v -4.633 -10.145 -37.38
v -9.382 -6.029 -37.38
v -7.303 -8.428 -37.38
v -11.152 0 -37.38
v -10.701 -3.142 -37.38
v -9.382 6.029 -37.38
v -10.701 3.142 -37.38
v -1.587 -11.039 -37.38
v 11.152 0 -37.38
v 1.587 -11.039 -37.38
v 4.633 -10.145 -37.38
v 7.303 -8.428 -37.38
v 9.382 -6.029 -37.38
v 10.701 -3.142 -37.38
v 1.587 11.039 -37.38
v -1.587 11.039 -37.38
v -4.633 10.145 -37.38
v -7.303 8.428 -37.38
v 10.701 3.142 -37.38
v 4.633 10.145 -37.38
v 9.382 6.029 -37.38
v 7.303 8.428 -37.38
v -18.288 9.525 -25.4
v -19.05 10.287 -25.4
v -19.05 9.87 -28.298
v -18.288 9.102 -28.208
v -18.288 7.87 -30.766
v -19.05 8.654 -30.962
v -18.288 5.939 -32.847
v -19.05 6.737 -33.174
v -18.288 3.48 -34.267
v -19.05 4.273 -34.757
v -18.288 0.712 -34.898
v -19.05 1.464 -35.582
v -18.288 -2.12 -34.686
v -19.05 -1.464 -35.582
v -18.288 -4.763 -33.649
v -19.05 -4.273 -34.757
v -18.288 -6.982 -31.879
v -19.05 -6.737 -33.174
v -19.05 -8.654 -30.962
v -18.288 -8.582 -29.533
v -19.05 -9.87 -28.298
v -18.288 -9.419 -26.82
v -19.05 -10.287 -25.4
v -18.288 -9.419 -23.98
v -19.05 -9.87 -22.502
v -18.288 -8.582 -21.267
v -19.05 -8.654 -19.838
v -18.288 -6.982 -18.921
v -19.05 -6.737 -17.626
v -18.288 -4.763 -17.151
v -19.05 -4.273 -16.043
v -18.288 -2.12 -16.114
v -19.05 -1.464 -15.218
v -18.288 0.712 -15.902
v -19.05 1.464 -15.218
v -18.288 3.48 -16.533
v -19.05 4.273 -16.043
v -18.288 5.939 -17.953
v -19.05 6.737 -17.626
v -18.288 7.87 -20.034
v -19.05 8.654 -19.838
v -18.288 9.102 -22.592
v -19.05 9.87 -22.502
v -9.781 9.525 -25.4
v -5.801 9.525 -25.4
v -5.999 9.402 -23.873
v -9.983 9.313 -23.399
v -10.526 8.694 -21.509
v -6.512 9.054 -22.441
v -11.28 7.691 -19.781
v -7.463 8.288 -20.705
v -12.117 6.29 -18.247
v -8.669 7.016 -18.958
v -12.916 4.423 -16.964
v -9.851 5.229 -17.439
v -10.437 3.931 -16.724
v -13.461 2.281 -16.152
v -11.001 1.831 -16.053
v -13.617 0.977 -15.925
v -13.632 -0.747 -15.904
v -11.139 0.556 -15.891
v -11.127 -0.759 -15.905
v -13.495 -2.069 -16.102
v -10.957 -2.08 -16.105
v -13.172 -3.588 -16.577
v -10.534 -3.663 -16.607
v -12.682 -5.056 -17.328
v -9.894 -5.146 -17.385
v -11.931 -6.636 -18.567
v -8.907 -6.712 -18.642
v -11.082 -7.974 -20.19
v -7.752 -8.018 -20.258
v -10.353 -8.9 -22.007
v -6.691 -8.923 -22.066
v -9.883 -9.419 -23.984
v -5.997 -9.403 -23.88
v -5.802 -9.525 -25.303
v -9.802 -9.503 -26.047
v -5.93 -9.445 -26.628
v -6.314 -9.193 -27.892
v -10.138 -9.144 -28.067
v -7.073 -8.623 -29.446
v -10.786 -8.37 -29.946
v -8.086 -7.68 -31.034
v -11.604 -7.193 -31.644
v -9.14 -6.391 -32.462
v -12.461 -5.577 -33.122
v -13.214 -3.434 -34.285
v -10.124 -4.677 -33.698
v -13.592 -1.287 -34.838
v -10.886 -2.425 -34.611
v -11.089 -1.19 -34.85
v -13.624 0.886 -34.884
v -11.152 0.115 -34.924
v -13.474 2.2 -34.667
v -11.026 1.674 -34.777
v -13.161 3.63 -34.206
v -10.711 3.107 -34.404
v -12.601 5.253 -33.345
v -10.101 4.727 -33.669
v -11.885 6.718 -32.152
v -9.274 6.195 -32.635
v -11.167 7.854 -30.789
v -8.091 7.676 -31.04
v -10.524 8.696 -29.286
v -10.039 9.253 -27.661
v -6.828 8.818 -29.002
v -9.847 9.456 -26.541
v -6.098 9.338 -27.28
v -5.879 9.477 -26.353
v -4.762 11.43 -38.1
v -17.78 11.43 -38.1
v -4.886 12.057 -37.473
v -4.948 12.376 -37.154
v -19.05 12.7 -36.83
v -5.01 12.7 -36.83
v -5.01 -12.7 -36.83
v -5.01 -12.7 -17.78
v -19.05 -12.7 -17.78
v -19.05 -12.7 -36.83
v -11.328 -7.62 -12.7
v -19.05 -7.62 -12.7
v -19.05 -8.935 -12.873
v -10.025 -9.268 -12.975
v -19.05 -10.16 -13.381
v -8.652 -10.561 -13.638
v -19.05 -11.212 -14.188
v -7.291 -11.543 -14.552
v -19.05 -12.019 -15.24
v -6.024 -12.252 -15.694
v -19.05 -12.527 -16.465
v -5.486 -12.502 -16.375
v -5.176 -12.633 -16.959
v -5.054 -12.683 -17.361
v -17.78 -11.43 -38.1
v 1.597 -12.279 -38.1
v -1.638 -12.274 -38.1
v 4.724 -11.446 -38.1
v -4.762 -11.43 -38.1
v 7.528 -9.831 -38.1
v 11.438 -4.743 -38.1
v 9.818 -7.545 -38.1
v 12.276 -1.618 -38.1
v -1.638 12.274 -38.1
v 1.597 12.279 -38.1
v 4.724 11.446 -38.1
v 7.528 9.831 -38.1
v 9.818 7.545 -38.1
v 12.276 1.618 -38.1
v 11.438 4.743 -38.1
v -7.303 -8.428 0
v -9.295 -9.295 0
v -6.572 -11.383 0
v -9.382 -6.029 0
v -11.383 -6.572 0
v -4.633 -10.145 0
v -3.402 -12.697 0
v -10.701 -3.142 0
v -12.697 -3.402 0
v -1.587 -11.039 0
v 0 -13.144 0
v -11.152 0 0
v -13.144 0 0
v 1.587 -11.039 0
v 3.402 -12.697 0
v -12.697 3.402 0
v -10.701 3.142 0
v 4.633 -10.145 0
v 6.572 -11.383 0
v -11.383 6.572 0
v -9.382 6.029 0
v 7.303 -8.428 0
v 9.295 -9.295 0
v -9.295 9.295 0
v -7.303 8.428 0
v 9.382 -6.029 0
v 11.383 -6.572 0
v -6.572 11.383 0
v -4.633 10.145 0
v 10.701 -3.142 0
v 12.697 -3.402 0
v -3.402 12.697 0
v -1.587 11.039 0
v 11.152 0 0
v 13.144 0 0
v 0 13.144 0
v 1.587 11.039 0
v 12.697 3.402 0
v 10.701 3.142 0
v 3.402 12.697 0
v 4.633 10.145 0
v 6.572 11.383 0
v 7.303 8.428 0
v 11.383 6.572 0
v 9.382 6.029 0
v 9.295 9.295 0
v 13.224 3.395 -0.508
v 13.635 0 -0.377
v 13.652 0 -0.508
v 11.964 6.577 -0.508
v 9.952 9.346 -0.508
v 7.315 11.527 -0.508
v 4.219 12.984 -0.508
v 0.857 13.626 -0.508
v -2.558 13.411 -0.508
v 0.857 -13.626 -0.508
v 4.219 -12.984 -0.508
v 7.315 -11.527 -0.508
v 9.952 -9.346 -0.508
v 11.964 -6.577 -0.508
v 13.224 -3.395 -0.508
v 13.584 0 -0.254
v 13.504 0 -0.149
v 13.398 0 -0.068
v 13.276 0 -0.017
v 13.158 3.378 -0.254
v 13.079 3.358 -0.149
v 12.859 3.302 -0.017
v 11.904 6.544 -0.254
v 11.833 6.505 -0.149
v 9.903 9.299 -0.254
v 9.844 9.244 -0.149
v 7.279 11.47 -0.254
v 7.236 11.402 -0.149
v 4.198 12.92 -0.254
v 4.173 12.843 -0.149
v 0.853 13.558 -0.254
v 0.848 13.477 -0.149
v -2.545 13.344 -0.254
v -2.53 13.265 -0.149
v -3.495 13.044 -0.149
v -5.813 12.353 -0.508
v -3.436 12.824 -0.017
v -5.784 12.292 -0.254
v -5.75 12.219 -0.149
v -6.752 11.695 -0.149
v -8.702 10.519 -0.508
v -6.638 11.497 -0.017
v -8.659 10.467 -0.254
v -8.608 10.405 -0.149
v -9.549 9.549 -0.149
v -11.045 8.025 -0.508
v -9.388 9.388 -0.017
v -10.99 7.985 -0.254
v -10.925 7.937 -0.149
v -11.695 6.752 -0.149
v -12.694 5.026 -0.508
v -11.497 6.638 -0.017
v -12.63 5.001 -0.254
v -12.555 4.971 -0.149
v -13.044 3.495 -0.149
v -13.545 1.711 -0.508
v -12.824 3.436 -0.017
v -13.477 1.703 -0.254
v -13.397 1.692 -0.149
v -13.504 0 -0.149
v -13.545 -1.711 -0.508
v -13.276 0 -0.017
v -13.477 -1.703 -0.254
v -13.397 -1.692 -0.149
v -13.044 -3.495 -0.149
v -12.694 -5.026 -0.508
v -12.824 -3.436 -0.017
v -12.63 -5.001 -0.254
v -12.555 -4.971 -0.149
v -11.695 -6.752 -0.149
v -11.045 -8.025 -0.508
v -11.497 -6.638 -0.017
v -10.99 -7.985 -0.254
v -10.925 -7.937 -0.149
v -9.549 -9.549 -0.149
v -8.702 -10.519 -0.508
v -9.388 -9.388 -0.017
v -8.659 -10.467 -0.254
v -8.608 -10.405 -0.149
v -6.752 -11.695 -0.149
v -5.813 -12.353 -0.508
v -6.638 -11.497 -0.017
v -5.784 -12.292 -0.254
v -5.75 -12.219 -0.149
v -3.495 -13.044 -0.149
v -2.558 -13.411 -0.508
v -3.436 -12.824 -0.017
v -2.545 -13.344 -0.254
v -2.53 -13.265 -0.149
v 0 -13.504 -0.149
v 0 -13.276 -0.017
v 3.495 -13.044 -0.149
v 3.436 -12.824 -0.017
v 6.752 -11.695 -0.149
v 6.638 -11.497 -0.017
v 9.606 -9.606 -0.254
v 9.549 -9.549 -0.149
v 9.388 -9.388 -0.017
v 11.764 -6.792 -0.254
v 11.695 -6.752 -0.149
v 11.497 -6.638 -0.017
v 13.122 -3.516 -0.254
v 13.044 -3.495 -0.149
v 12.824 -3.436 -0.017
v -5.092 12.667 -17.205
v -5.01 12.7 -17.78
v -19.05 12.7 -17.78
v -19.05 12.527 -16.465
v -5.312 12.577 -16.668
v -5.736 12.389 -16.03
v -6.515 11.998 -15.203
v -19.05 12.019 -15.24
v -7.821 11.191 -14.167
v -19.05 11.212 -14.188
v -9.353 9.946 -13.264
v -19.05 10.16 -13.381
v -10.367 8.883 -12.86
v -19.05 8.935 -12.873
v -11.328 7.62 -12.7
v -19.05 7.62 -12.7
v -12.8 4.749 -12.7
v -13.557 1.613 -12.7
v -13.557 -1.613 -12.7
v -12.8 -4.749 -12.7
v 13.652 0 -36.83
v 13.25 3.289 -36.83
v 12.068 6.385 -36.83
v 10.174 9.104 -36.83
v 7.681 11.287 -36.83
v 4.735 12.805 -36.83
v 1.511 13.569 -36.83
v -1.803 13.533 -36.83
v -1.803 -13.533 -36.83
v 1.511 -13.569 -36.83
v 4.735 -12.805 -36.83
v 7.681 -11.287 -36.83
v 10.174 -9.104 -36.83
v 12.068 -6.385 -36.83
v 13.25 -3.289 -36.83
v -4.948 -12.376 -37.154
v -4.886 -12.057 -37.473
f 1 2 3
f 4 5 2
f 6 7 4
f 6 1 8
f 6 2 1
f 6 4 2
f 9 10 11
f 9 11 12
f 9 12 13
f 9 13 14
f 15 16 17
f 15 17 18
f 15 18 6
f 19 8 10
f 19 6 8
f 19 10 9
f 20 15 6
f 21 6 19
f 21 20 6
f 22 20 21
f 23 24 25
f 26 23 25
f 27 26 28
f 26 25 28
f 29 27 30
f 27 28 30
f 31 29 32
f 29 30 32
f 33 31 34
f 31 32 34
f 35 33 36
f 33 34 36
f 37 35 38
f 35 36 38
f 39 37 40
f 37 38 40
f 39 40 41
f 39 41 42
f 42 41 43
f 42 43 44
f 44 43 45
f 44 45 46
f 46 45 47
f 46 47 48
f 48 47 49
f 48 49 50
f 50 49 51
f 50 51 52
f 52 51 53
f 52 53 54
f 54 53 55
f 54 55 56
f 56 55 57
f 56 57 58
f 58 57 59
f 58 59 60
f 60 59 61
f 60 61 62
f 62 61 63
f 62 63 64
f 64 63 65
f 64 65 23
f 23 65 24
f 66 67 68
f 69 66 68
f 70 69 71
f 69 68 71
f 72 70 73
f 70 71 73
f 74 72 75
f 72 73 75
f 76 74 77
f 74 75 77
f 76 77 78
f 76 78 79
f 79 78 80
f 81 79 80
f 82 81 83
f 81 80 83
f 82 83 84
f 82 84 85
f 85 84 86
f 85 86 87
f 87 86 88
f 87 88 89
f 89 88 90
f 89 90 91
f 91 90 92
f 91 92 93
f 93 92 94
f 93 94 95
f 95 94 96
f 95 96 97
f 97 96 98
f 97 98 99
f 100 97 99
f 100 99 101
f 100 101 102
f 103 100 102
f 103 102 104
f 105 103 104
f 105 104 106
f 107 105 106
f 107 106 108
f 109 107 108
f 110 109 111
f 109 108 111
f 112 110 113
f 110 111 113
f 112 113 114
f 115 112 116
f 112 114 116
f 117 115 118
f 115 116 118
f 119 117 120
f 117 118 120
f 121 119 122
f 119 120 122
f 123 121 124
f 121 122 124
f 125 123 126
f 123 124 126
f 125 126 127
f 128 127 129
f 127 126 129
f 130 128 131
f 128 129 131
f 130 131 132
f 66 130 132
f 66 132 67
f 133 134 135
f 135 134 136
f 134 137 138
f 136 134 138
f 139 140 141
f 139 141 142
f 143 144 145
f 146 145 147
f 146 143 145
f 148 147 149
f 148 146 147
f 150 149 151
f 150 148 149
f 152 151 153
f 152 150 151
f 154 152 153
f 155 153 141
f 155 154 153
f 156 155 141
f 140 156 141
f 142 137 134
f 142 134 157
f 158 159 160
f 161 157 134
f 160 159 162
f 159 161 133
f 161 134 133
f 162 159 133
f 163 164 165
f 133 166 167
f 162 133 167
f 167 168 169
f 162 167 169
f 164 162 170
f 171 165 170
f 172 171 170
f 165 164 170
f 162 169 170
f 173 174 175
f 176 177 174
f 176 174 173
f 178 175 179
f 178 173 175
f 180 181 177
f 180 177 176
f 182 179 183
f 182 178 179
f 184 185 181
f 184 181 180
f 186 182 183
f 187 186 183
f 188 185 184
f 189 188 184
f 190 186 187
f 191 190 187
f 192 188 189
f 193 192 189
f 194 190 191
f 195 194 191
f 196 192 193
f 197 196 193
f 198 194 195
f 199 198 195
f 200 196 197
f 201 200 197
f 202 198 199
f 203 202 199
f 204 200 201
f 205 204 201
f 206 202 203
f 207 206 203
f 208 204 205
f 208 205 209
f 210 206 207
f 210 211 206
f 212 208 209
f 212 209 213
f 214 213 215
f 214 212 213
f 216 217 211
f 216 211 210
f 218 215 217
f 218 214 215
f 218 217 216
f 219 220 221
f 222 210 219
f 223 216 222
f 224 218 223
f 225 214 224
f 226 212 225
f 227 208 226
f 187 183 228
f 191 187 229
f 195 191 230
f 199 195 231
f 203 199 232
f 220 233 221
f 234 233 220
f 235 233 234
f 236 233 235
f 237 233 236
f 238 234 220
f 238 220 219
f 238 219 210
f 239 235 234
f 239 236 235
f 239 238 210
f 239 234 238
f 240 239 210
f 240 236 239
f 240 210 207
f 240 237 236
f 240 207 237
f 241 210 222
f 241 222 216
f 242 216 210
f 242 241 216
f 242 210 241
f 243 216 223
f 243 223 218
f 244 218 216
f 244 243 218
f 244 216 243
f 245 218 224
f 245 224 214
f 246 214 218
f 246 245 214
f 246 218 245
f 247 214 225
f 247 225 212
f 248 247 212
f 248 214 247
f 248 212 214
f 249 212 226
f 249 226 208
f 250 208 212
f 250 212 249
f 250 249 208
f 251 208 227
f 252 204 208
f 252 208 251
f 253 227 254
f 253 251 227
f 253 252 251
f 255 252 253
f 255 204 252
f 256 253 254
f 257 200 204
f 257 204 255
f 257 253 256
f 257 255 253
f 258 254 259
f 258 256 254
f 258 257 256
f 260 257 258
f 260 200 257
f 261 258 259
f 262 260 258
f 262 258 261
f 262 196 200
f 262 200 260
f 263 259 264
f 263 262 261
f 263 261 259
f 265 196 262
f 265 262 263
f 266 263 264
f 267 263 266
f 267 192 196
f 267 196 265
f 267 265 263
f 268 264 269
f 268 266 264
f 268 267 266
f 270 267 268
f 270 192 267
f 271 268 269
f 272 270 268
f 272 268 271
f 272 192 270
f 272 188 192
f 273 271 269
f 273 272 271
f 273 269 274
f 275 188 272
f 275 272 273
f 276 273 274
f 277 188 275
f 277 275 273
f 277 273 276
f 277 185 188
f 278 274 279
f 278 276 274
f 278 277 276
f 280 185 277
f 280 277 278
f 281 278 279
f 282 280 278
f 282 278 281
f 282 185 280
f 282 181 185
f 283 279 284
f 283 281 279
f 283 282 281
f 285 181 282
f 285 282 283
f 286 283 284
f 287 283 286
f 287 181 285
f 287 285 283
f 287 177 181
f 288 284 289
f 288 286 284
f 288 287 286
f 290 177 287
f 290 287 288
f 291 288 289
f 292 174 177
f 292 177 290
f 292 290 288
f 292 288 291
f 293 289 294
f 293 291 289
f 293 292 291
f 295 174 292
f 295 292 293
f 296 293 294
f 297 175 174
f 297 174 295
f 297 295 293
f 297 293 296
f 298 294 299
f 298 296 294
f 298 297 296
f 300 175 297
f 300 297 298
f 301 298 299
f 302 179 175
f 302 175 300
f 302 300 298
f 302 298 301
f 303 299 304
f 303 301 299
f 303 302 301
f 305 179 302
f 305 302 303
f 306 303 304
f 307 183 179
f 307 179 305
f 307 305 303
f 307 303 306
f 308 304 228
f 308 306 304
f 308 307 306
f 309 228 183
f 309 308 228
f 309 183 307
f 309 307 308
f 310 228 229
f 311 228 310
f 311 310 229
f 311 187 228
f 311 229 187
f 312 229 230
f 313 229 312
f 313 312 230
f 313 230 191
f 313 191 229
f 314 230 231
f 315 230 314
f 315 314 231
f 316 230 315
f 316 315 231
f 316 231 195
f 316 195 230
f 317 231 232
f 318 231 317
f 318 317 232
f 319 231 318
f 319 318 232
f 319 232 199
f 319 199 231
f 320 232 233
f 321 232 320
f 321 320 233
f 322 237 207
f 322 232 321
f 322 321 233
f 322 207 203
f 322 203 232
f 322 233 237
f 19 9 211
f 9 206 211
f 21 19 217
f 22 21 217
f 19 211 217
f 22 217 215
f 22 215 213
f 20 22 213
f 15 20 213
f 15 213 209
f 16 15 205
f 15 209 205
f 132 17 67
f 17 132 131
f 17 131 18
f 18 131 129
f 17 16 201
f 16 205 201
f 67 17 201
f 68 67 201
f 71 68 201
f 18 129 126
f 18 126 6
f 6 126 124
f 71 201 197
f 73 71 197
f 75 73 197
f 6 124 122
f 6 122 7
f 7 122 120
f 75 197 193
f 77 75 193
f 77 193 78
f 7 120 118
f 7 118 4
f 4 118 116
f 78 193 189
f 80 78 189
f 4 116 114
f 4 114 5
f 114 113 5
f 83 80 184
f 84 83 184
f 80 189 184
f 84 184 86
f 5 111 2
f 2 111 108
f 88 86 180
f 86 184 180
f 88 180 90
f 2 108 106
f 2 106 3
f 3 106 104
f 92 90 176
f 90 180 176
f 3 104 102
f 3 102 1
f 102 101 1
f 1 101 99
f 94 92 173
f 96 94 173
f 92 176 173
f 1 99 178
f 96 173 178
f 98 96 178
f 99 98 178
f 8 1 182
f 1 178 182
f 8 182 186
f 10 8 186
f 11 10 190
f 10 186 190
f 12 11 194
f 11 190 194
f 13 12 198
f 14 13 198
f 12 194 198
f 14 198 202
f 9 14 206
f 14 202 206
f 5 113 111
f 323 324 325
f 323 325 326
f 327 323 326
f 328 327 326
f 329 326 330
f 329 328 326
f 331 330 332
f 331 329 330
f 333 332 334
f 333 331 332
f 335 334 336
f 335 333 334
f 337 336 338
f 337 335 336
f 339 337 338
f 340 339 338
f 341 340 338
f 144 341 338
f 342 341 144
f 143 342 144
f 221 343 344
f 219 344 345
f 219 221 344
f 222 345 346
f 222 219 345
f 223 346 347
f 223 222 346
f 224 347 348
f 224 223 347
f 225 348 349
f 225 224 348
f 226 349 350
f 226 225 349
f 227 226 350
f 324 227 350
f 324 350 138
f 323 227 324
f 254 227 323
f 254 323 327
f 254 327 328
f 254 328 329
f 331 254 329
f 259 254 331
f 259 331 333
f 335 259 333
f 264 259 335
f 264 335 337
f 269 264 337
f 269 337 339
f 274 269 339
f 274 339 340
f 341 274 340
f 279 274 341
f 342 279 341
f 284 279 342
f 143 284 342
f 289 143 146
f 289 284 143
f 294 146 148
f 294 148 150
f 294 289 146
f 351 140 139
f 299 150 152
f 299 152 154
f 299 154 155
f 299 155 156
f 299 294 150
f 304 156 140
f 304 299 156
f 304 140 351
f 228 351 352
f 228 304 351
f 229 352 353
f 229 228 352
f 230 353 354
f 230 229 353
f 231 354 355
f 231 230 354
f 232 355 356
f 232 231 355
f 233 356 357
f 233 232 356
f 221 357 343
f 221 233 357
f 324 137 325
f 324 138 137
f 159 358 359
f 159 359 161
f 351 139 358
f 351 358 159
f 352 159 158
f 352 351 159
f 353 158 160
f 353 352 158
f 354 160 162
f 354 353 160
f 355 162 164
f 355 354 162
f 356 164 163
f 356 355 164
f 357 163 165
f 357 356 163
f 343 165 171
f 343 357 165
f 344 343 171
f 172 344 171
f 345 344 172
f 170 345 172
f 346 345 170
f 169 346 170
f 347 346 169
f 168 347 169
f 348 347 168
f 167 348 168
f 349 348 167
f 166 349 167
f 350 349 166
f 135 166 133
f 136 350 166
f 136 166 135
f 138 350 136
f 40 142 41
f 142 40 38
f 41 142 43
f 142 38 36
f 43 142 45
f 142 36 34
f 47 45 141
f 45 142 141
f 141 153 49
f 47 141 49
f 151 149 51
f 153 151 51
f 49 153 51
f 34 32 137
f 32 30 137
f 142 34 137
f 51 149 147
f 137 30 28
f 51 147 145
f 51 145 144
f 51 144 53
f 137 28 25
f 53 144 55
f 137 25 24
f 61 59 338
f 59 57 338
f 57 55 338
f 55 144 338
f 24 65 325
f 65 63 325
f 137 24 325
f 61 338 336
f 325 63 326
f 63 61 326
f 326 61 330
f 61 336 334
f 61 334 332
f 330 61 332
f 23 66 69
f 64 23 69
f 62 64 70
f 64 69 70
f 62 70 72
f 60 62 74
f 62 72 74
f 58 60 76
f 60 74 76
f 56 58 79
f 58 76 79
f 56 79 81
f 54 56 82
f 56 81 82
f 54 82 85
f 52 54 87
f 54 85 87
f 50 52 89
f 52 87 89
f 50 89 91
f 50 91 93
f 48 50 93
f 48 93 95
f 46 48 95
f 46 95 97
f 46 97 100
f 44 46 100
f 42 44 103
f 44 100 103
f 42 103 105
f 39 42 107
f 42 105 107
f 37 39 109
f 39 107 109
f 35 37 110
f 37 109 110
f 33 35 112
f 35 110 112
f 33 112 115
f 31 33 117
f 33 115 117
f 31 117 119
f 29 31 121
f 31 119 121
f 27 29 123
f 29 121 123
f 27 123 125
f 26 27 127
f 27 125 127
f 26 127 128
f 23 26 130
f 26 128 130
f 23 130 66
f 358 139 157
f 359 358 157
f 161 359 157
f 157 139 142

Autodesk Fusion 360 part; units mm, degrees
sketch "Sketch1" plane through (0, 0, 0) normal (0, 0, 1) x (1, 0, 0)
  circle A0 centre (0, 0) radius 13.7922 construction
  circle A1 centre (0, 0) radius 13.6525
  circle A2 centre (0, 0) radius 11.1525
  dimension "d1" = 27.5844
  dimension "d2" = 27.305
  dimension "d3" = 2.5
extrude "Extrude1" add sketch "Sketch1" against normal blind 38.1 contours A1 | A2
sketch "Sketch2" plane through (0, 0, 0) normal (1, 0, 0) x (0, 1, 0)
  line L0 (0, 0) -> (0, -39.2845) construction
  circle A0 centre (0, -25.4) radius 9.525
  line L1 (0, 0) -> (-28.4764, 0) construction
  circle A1 centre (0, -25.4) radius 12.7 construction
  line L2 (-13.6525, -38.1) -> (13.6525, -38.1) construction
  line L3 (-12.7, -38.1) -> (12.7, -38.1)
  line L4 (12.7, -38.1) -> (12.7, -17.78)
  line L5 (7.62, -12.7) -> (-7.62, -12.7)
  line L6 (-12.7, -17.78) -> (-12.7, -38.1)
  line L7 (-12.7, -38.1) -> (12.7, -12.7) construction
  line L8 (12.7, -38.1) -> (-12.7, -12.7) construction
  arc A2 (12.7, -17.78) -> (7.62, -12.7) centre (7.62, -17.78) ccw
  arc A3 (-7.62, -12.7) -> (-12.7, -17.78) centre (-7.62, -17.78) ccw
  point P0 (0, -25.4)
  dimension "d6" = 19.05
  dimension "d8" = 25.4
  dimension "d9" = 5.08
  dimension "d10" = 5.08
extrude "Extrude2" add sketch "Sketch2" against normal blind 19.05
extrude "Extrude3" cut sketch "Sketch2" against normal blind 34.8234 contours A0
extrude "Extrude4" cut sketch "Sketch1" against normal up to surface (37.38 mm away) contours A2
fillet "Fillet1" radius 0.508 1 edges at (-12.7286, -4.937, 0)
chamfer "Chamfer1" distance 1.27 angle 45 1 faces at (1.1599, 0.6789, -38.1)
chamfer "Chamfer2" distance 0.762 angle 45 1 edges at (-19.05, -8.8804, -28.8444)
